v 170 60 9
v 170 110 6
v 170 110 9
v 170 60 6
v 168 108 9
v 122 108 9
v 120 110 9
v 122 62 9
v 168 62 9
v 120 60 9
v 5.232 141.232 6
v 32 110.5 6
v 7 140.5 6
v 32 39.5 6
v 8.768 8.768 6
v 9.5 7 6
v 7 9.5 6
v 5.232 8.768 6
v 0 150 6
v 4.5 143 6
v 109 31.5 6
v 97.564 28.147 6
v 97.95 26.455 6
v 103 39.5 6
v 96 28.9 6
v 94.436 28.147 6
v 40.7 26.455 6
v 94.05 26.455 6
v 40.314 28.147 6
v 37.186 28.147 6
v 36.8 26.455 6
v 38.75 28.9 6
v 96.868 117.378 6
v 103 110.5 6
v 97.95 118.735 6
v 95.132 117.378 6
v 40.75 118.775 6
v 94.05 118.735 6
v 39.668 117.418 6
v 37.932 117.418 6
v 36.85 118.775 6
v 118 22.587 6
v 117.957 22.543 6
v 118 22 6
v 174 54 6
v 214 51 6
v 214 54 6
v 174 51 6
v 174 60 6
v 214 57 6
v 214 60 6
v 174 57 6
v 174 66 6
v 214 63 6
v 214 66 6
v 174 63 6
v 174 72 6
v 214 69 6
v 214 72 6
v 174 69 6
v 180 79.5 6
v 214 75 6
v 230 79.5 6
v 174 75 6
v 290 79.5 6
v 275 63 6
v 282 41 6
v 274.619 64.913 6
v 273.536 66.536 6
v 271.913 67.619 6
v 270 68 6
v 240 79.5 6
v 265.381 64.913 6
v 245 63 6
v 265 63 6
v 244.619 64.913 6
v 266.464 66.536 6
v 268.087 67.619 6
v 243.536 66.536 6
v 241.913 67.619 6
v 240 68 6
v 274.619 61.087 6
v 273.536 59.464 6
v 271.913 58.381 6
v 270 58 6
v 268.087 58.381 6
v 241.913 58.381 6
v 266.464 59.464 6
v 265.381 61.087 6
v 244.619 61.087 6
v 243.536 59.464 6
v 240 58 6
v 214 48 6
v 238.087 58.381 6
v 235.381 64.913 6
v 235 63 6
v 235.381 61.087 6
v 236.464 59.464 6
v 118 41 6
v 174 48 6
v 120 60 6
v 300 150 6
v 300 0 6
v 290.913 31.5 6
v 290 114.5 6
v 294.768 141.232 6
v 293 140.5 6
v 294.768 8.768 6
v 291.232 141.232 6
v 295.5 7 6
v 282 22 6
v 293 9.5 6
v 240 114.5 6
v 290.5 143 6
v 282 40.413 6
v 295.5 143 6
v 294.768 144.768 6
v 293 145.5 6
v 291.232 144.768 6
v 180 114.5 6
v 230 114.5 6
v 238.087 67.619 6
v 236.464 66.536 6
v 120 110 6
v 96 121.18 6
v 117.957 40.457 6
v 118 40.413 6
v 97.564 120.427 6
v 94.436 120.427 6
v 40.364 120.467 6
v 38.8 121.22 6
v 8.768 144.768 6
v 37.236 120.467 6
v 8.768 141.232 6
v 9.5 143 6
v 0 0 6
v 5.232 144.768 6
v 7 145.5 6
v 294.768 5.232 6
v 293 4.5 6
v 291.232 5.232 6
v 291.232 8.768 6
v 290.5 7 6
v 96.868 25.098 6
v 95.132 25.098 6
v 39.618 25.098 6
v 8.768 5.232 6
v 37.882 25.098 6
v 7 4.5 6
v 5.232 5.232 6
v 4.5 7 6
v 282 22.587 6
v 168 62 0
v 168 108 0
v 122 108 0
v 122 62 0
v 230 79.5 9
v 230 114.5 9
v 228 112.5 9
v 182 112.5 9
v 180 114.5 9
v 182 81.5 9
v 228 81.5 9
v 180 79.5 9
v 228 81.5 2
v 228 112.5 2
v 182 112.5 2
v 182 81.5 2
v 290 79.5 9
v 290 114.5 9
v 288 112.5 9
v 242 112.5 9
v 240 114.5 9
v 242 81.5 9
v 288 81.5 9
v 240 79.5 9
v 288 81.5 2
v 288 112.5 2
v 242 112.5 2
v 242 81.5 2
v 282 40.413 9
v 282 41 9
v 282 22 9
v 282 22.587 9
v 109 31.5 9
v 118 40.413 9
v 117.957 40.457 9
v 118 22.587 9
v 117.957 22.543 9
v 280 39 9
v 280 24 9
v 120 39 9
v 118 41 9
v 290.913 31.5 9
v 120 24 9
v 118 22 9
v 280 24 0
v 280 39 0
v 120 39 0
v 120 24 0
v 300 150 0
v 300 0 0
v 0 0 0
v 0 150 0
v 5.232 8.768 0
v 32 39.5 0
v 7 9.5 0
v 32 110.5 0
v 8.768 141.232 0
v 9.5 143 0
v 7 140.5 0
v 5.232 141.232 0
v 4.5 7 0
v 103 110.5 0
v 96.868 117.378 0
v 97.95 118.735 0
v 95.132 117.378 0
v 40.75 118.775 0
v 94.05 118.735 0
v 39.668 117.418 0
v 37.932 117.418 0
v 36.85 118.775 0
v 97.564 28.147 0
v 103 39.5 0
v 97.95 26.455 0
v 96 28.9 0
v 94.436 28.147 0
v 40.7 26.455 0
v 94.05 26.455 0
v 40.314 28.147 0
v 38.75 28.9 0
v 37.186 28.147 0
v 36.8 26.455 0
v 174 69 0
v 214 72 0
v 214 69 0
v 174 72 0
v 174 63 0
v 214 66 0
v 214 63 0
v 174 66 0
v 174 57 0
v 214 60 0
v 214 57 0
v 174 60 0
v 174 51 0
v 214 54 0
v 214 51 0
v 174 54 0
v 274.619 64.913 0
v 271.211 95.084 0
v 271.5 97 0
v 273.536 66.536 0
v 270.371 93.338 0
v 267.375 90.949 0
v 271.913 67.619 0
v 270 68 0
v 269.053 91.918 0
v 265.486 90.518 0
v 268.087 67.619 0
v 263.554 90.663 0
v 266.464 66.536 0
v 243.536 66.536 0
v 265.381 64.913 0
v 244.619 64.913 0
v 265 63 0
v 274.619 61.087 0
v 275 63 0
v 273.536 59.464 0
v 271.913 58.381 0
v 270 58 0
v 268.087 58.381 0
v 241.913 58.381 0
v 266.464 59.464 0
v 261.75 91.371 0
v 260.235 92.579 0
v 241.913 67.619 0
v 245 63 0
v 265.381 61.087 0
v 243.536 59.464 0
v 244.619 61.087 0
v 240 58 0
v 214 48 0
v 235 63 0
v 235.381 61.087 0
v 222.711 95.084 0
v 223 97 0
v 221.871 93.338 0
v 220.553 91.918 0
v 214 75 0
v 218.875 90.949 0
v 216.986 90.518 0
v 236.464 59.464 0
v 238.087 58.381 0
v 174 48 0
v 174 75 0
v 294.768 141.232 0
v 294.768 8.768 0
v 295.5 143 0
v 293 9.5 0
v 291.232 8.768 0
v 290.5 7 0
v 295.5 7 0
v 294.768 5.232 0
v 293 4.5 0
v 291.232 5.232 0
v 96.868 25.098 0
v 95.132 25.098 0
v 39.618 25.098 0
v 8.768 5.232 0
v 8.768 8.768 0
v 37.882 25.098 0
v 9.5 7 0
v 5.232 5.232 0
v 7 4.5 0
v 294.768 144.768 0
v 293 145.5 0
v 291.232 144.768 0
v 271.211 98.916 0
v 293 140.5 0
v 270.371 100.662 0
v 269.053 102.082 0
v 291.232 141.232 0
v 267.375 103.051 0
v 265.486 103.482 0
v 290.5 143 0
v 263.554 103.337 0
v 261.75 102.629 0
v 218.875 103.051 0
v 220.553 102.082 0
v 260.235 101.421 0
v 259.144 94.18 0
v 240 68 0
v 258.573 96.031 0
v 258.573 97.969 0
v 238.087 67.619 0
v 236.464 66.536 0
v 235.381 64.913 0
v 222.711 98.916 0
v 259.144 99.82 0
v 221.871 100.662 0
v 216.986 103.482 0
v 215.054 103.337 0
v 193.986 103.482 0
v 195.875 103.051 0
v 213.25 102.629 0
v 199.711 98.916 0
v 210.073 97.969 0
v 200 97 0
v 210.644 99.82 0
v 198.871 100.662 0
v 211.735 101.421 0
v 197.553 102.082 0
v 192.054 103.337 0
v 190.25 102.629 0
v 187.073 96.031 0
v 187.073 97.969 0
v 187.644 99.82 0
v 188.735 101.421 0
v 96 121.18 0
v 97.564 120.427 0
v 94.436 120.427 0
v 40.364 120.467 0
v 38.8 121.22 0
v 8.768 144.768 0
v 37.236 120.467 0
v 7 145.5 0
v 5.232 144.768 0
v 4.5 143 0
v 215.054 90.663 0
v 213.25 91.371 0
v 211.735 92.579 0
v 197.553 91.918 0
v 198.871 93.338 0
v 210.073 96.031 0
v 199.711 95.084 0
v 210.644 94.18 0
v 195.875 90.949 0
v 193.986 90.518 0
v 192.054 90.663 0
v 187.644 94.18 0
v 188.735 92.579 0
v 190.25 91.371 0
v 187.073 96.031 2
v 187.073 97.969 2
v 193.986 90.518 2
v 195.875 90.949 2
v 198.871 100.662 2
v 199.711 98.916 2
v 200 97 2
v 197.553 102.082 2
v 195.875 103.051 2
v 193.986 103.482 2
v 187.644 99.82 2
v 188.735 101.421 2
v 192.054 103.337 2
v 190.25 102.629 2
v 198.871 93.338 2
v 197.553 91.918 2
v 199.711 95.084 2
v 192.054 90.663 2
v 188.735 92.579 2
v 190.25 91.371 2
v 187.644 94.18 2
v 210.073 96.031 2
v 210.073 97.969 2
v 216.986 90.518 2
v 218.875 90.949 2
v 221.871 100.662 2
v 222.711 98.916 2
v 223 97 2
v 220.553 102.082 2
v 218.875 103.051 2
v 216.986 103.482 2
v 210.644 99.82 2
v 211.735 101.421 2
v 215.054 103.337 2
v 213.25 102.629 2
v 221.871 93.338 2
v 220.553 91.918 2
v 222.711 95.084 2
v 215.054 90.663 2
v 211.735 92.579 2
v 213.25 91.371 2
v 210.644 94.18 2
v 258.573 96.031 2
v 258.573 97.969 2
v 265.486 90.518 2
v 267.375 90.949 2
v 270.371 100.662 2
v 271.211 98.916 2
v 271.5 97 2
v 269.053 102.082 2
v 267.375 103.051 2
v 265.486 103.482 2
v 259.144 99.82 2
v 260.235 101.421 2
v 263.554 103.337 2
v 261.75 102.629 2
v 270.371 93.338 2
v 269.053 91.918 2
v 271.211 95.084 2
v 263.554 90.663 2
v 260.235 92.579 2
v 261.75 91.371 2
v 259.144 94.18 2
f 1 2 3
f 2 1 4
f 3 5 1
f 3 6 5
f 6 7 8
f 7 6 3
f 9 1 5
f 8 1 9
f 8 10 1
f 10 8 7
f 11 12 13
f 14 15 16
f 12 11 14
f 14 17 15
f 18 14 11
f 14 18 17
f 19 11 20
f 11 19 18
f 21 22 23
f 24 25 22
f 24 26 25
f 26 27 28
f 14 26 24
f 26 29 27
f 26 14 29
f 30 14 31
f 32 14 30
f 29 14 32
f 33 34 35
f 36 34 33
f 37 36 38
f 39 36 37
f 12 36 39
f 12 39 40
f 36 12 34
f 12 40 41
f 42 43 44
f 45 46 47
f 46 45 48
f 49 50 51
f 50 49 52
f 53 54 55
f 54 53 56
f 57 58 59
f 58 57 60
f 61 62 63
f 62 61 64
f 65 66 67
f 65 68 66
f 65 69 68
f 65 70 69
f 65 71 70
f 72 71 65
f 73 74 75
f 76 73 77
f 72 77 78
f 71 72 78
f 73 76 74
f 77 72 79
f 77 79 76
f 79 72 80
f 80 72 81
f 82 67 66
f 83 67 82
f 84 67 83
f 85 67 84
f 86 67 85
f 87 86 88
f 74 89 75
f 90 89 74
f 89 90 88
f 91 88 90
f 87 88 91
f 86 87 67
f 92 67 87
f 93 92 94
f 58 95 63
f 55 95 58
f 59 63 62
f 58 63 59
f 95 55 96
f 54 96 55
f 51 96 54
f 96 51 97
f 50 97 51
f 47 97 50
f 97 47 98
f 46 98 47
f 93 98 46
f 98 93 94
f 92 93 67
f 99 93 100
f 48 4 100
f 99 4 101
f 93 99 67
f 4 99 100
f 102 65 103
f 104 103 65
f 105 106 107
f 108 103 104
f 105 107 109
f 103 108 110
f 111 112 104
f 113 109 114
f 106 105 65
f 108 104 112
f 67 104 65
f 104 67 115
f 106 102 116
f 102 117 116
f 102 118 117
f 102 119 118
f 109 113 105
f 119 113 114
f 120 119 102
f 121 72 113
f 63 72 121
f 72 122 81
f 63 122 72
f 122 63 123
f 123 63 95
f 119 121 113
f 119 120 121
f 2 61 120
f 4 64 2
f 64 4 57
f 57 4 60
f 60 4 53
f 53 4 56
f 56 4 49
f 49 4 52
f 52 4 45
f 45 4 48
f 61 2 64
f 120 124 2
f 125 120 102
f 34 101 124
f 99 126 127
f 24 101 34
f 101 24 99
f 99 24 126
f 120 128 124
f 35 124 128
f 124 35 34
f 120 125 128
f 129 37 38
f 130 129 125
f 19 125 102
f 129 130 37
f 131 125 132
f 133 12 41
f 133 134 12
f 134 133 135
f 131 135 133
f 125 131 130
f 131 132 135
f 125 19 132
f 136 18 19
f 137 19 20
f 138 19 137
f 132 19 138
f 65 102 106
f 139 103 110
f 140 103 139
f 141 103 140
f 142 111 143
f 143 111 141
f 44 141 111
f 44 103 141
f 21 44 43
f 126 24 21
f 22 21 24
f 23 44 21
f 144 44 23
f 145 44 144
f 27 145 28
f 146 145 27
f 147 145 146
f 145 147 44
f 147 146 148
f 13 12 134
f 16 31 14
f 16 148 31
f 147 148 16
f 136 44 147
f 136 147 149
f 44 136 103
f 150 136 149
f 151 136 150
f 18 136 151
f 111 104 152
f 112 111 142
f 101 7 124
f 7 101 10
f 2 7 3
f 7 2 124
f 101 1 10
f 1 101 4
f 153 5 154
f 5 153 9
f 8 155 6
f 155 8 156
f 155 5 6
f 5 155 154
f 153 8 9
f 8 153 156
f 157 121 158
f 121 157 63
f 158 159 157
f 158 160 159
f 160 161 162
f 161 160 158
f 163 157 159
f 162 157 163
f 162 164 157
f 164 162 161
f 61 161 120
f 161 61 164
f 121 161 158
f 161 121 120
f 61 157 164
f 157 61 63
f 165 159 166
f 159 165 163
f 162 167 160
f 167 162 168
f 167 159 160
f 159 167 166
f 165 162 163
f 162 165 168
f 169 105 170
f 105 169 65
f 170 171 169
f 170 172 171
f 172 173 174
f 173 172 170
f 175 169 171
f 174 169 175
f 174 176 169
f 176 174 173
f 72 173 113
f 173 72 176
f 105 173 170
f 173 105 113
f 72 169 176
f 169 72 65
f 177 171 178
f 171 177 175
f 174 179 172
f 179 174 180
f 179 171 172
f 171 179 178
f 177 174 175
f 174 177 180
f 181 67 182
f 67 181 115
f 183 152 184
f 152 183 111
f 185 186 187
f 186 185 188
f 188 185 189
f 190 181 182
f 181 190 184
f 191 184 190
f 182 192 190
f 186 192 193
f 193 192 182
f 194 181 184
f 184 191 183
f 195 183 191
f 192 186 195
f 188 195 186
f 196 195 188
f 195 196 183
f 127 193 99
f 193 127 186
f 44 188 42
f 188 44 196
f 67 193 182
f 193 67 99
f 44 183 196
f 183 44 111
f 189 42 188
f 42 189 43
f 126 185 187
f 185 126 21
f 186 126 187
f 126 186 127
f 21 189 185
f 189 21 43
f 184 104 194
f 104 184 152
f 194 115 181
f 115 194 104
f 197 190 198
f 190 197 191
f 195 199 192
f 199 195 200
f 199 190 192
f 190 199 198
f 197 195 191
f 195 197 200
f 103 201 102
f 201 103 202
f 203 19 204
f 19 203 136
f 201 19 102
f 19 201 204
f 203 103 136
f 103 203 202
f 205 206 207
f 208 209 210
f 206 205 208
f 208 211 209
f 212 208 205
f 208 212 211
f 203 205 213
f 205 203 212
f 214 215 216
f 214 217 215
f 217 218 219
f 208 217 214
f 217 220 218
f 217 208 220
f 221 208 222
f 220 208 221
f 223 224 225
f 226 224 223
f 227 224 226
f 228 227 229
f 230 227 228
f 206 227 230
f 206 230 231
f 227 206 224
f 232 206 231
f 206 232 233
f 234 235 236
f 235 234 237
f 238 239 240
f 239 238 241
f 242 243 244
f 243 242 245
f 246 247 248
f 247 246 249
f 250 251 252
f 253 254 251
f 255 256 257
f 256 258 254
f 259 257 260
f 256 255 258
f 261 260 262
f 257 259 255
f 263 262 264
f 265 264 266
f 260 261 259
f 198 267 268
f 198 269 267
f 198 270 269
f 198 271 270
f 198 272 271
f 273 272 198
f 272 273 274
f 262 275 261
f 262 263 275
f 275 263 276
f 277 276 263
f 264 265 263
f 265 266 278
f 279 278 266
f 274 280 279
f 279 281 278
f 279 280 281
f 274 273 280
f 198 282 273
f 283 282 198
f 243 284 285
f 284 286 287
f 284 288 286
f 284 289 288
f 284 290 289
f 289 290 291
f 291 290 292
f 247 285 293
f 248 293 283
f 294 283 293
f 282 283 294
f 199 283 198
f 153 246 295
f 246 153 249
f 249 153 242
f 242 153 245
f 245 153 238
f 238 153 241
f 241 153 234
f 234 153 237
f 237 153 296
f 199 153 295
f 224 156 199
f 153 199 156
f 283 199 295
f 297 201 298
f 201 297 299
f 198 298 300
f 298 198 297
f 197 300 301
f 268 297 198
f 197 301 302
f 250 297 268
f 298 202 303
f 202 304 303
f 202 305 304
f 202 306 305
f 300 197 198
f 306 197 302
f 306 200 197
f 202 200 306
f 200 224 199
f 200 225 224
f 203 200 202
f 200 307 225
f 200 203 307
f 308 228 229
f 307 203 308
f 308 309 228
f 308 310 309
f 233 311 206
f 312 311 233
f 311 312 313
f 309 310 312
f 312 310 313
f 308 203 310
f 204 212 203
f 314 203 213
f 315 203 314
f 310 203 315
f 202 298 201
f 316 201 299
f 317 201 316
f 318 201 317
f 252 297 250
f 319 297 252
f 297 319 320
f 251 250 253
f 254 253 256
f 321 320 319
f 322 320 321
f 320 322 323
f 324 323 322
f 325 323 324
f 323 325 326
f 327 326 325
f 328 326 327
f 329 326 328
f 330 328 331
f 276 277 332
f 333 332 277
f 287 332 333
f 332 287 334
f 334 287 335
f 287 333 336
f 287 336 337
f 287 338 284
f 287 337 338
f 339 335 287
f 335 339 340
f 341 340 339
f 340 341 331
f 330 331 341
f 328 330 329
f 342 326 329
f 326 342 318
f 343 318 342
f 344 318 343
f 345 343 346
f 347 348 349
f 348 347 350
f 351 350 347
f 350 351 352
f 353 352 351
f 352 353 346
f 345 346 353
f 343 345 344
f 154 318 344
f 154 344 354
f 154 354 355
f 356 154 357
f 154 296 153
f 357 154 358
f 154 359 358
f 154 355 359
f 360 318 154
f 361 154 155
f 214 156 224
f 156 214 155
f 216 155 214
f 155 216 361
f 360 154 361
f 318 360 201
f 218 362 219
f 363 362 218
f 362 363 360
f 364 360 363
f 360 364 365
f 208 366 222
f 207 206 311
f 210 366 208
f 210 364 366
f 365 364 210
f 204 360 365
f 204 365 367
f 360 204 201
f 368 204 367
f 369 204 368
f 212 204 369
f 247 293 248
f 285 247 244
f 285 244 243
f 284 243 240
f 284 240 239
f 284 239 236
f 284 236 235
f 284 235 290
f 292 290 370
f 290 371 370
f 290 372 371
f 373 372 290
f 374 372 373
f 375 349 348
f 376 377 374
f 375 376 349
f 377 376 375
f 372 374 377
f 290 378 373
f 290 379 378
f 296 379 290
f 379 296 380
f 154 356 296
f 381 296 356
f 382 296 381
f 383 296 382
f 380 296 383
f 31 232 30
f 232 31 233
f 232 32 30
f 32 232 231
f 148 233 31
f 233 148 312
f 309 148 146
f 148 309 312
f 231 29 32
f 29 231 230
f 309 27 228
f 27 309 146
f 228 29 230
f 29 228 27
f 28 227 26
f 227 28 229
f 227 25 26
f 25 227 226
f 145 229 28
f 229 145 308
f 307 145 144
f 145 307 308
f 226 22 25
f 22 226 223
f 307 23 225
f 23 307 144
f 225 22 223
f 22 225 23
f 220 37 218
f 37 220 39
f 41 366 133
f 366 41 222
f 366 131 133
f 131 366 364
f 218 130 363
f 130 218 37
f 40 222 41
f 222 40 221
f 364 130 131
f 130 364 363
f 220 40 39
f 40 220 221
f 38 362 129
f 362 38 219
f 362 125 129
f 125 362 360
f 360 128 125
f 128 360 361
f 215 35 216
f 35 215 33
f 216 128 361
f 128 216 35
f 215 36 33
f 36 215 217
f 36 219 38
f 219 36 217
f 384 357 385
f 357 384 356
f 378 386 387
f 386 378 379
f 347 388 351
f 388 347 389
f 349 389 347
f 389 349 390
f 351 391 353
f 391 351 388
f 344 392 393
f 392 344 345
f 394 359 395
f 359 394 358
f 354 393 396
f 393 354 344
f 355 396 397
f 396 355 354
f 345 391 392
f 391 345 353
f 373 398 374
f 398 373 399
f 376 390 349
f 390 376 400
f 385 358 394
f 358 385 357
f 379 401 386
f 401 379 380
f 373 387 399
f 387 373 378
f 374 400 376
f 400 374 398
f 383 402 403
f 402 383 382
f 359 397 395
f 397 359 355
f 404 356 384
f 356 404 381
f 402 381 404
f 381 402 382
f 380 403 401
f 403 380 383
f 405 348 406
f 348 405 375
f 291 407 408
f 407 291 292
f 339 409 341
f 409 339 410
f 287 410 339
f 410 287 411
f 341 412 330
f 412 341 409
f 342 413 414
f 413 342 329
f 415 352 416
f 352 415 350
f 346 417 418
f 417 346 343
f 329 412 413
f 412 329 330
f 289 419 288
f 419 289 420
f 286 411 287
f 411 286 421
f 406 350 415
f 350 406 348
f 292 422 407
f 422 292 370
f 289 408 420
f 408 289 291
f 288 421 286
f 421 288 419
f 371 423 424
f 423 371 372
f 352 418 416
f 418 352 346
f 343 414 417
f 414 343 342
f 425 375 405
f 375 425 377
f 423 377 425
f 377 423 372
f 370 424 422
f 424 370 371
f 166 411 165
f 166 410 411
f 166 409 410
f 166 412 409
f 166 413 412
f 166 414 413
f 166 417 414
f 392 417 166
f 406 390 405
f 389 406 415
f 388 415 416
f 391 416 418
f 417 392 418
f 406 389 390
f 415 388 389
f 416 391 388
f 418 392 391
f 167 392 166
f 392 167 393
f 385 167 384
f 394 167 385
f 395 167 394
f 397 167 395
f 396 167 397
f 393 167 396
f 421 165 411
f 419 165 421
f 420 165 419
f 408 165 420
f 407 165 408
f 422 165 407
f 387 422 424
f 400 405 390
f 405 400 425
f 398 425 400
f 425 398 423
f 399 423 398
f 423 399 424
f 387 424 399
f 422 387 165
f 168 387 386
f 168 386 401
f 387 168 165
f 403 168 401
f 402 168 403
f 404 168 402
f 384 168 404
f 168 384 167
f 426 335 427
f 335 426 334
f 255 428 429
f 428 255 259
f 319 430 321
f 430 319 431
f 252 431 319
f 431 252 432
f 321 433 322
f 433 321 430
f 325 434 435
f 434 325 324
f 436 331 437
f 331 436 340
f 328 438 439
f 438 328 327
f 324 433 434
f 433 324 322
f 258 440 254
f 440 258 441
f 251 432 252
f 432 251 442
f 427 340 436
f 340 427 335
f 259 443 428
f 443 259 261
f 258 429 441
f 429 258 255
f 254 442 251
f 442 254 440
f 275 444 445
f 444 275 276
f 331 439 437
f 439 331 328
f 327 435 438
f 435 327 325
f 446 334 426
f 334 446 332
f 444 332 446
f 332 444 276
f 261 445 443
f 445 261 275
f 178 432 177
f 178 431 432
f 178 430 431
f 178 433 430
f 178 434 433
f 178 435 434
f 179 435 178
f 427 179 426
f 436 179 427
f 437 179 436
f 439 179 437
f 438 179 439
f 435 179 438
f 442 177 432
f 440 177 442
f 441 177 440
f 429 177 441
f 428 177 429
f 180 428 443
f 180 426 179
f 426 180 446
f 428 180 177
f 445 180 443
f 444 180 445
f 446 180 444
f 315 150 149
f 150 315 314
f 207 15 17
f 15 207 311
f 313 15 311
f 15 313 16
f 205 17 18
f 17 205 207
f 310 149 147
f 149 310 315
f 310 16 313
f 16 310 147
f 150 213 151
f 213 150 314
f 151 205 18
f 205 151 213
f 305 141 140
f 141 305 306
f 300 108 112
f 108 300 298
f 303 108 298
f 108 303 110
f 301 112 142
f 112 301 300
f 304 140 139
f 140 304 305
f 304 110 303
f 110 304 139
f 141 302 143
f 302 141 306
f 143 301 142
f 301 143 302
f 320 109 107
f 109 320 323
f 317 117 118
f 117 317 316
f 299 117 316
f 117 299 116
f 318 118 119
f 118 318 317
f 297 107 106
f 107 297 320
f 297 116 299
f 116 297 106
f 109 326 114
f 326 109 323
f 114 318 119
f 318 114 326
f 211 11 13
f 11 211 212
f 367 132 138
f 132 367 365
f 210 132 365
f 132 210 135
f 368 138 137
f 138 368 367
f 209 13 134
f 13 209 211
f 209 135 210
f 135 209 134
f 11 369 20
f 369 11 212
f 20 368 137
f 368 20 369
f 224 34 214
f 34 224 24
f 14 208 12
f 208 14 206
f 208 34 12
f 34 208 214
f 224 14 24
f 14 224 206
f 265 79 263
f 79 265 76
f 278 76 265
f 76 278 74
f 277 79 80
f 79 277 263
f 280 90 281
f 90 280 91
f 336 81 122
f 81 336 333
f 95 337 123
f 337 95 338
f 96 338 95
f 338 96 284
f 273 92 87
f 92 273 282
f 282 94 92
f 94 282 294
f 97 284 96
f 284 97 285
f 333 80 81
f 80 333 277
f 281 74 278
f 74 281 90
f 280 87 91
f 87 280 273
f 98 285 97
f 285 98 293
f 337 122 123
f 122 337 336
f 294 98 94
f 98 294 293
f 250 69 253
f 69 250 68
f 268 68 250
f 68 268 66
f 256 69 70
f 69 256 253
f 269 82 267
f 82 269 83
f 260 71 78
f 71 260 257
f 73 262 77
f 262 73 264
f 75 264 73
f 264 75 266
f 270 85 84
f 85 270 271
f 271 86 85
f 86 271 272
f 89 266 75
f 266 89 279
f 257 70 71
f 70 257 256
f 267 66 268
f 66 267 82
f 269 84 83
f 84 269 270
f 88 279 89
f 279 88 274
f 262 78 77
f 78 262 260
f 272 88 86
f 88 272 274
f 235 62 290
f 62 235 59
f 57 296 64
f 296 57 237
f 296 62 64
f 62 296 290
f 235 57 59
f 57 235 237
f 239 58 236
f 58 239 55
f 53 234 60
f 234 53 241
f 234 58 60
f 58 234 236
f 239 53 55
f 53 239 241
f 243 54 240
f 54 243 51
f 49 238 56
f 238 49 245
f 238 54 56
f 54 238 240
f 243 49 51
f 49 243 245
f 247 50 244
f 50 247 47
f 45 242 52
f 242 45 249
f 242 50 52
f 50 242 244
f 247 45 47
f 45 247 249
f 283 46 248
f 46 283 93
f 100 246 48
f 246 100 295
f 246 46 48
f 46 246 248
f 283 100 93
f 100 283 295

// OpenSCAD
// file: ../../components/leds.scad
module led_10(color="red",tolerance=0){
    
    $fn=15;
    
    // Measurements taken from https://evandesigns.com/pages/information-about-led-sizes
    total_height = 13.6+tolerance;
    body_radius = (10.0+tolerance)/2;
    lip_radius = (11+tolerance)/2;
    lip_height = 2;
    
    led(color,body_radius,total_height,lip_radius,lip_height);
}

module led_5(color="red",tolerance=0){
    
    $fn=15;
    
    // Measurements taken from https://evandesigns.com/pages/information-about-led-sizes
    total_height = 9.69+tolerance;
    body_radius = (5.0+tolerance)/2;
    lip_radius = (5.9+tolerance)/2;
    lip_height = 1;
    
    led(color,body_radius,total_height,lip_radius,lip_height);
}

module led_3(color="red",tolerance=0){
    
    $fn=15;
    
    // Measurements taken from https://evandesigns.com/pages/information-about-led-sizes
    total_height = 5.49+tolerance;
    body_radius = (3.0+tolerance)/2;
    lip_radius = (3.74+tolerance)/2;
    lip_height = 1;
    
    led(color,body_radius,total_height,lip_radius,lip_height);
}

module led(led_color,body_radius,total_height,lip_radius,lip_height){
    color(led_color){
        // Body.
        cylinder(r=body_radius,h=total_height-body_radius);
        // Lip.
        cylinder(r=lip_radius,h=lip_height);
        // Dome.
        translate([0,0,total_height-body_radius]){
            sphere(r=body_radius);
        }
    }
    
    // Leads.
    color("gray"){
        translate([0,2,-10]){
            cylinder(r=.5,h=10);
        }
        translate([0,-2,-12]){
            cylinder(r=.5,h=12);
        }
    }
}

/*
// Examples
led_5(color="green");
translate([10,0,0]){
    led_3(color="yellow");
}
translate([-10,0,0]){
    led_10();
}
*/
// file: ../../components/led_bargraph.scad
include <leds.scad>;

module led_bargraph(length, width, depth, led_count){
    
    TOLERANCE = 1;      // adjust until LED's "snap-in" 
    END_CAP_LENGTH = 5; // usually the LED diameter
    FLANGE = 10;

    // computed
    bar_length = length-(END_CAP_LENGTH*2);
    
    color("yellow",0.2)
    difference(){
        union(){
            // bar
            cube([bar_length,width,depth]);
            // end caps
            translate([-END_CAP_LENGTH,0,0]){
                cube([5,width,depth]);
                translate([-FLANGE,0,0]){
                    cube([FLANGE,width,depth]);
                }
            }
            translate([bar_length,0,0]){
                cube([5,width,depth]);
                translate([END_CAP_LENGTH,0,0]){
                    cube([FLANGE,width,depth]);
                }
            }
        }
        // subtract leds
        translate([0,width/2,0]){
            for(i=[0:led_count]){
                translate([i*(bar_length/led_count),0,0]){
                    led_5(tolerance=TOLERANCE);
                }
            }
        }
    }
}

// examples
//led_bargraph(length=10, width=10, depth=12, led_count=1);
//led_bargraph(length=160, width=15, depth=11, led_count=10);
// main file
include <../../components/led_bargraph.scad>

/*
Carbonite control panels

1" = 25.4mm

maximums:
length: 15" (381mm)
width: 5" (127mm)
height: 2"
*/

BASE_LENGTH = 300;
BASE_WIDTH = 150;//120;
BASE_HEIGHT = 50;

SCREEN_LENGTH = 75;
SCREEN_WIDTH = 75;

LARGE_PANEL_LENGTH = 50;
LARGE_PANEL_WIDTH = 50;

SMALL_PANEL_LENGTH = 50;
SMALL_PANEL_WIDTH = 35;

LONG_PANEL_LENGTH = 160;
LONG_PANEL_WIDTH = 15;

VENT_LENGTH = 40;
VENT_WIDTH = 3;

// Adjust these to match the actual hardware
BUTTON_RADIUS = 20;
BUTTON_MOUNT_RADIUS = 10;

WALL_THICKNESS = 3;
FRAME_THICKNESS = 2;

// Render preview
PREVIEW = false;
EXPLODED = true;

// ***
// Call individual modules here to render them for printing
// ***
panel();
//led_bargraph(length=LONG_PANEL_LENGTH+(FRAME_THICKNESS*2), width=LONG_PANEL_WIDTH+(FRAME_THICKNESS*2), depth=10, led_count=10);

// CCP1
LCD_MAX_SQUARE = 53;

//***
// module definitions
//***

module arduino_uno(){
    
    $fn=30;
    
    TOLERANCE=1;
    LENGTH=68.6;
    WIDTH=53.3;
    HEIGHT=5;   // just a guess at the board thickness
    HOLE_DIAMETER=3.2+TOLERANCE;
    
    // mounting holes (only bother with the two we're going to use for now)
    UL = [14.0+1.3,2.5+5.1+27.9+15.2,-1];
    UR = [14.0+1.3+50.8,2.5+5.1+27.9,-1];
    
    color("blue"){
        cube([LENGTH,WIDTH,HEIGHT]);
    }
    translate(UL){
        cylinder(r=HOLE_DIAMETER/2,h=HEIGHT*4);
    }
    translate(UR){
        cylinder(r=HOLE_DIAMETER/2,h=HEIGHT*4);
    }
}

module hiletgo_3_5_IPS_LCD(){    
    // Measured with LCD facing forward, pins on the right.
    LENGTH=96.6;
    WIDTH=60.7;
    HEIGHT=1.6;//4.9;
    MOUNTING_HOLE_DIAMETER=2.0; // measured at 1.5, but we're using M2 bolts so...
    MOUNTING_HOLE_Z_OFFSET = -1;
        
    // mounting hole offsets
    // left, top
    TL = [0.9+(MOUNTING_HOLE_DIAMETER/2),WIDTH-(0.45+(MOUNTING_HOLE_DIAMETER/2)),MOUNTING_HOLE_Z_OFFSET];
    // left, bottom
    BL = [0.9+(MOUNTING_HOLE_DIAMETER/2),1+(MOUNTING_HOLE_DIAMETER/2),MOUNTING_HOLE_Z_OFFSET];
    // right, top
    TR = [LENGTH-(1.38+(MOUNTING_HOLE_DIAMETER/2)),WIDTH-(0.5+(MOUNTING_HOLE_DIAMETER/2)),MOUNTING_HOLE_Z_OFFSET];
    // right, bottom
    BR = [LENGTH-(1.42+(MOUNTING_HOLE_DIAMETER/2)),1.0+(MOUNTING_HOLE_DIAMETER/2),MOUNTING_HOLE_Z_OFFSET];
    
    // LCD screen itself
    LCD_MODULE_LENGTH=84.95;
    LCD_MODULE_WIDTH=55.5;
    LCD_MODULE_HEIGHT=4.75-HEIGHT;
        
    union(){
        // board
        color("green"){
            cube([96.0,60.3,HEIGHT]);
        }
        // screen
        translate([5.2,2.75,HEIGHT]){
            color("black"){
                cube([LCD_MODULE_LENGTH,LCD_MODULE_WIDTH,LCD_MODULE_HEIGHT]);
            }
        }
    }
    
    // mounting holes
    translate(TL){
        cylinder(r=MOUNTING_HOLE_DIAMETER,h=HEIGHT*8);
    }
    translate(BL){
        cylinder(r=MOUNTING_HOLE_DIAMETER,h=HEIGHT*8);
    }
    translate(TR){
        cylinder(r=MOUNTING_HOLE_DIAMETER,h=HEIGHT*8);
    }
    translate(BR){
        cylinder(r=MOUNTING_HOLE_DIAMETER,h=HEIGHT*8);
    }
}

// base
module base(){
    difference(){
        cube([BASE_LENGTH,BASE_WIDTH,BASE_HEIGHT]);
        translate([WALL_THICKNESS,WALL_THICKNESS,WALL_THICKNESS]){
            cube([BASE_LENGTH-(WALL_THICKNESS*2),BASE_WIDTH-(WALL_THICKNESS*2),BASE_HEIGHT]);
        }
    }
}

// main panel
module panel(){
    color("grey")
    difference(){
        
        // panel base and frames
        union(){
            cube([BASE_LENGTH,BASE_WIDTH,WALL_THICKNESS]);
            translate([0,0,WALL_THICKNESS]){
                cube([BASE_LENGTH,BASE_WIDTH,WALL_THICKNESS]);
                
                translate([BASE_LENGTH*.40,BASE_WIDTH*.40,WALL_THICKNESS]){
                    large_frame();
                }
                translate([BASE_LENGTH*.60,BASE_WIDTH*.53,WALL_THICKNESS]){
                    small_frame();
                }
                translate([BASE_LENGTH*.80,BASE_WIDTH*.53,WALL_THICKNESS]){
                    small_frame();
                }
                translate([(BASE_LENGTH*.40)-FRAME_THICKNESS,(BASE_WIDTH*.16)-FRAME_THICKNESS,WALL_THICKNESS]){
                    long_frame();
                }    
            }
        }
        
        // mounting holes
        mounting_bolt_shaft_diameter = 5;
        translate([7,7,-1]){
            cylinder(r=mounting_bolt_shaft_diameter/2,h=WALL_THICKNESS*3);
        }
        translate([BASE_LENGTH-7,7,-1]){
            cylinder(r=mounting_bolt_shaft_diameter/2,h=WALL_THICKNESS*3);
        }
        translate([BASE_LENGTH-7,BASE_WIDTH-7,-1]){
            cylinder(r=mounting_bolt_shaft_diameter/2,h=WALL_THICKNESS*3);
        }
        translate([7,BASE_WIDTH-7,-1]){
            cylinder(r=mounting_bolt_shaft_diameter/2,h=WALL_THICKNESS*3);
        }
        
        // LCD mounting holes
        translate([98,(BASE_WIDTH/2)-50,-5]){
            rotate([0,0,90]){
                hiletgo_3_5_IPS_LCD();
            }
        }
        
        // screen opening
        translate([BASE_LENGTH*.10+FRAME_THICKNESS,(BASE_WIDTH/2)-(SCREEN_WIDTH/2)+FRAME_THICKNESS,-1]){
            cube([SCREEN_LENGTH-(FRAME_THICKNESS*2),SCREEN_WIDTH-(FRAME_THICKNESS*2),(WALL_THICKNESS*2)+2]);
        }
        
        // large subpanel opening
        translate([BASE_LENGTH*.40+FRAME_THICKNESS,BASE_WIDTH*.40+FRAME_THICKNESS,-1]){
            cube([LARGE_PANEL_LENGTH-(FRAME_THICKNESS*2),LARGE_PANEL_WIDTH-(FRAME_THICKNESS*2),(WALL_THICKNESS*2)+2]);
        }
        
        // small subpanel A
        translate([BASE_LENGTH*.60+FRAME_THICKNESS,BASE_WIDTH*.53+FRAME_THICKNESS,-1]){
            subpanel_length = SMALL_PANEL_LENGTH-(FRAME_THICKNESS*2);
            subpanel_width = SMALL_PANEL_WIDTH-(FRAME_THICKNESS*2);
            
            translate([subpanel_length/4,subpanel_width/2,-1]){
                cylinder(r=13/2,h=(WALL_THICKNESS*2)+2);
            }
            translate([subpanel_length-(subpanel_length/4),subpanel_width/2,-1]){
                cylinder(r=13/2,h=WALL_THICKNESS+2);
            }
            translate([0,0,WALL_THICKNESS]){
                cube([SMALL_PANEL_LENGTH-(FRAME_THICKNESS*2),SMALL_PANEL_WIDTH-(FRAME_THICKNESS*2),WALL_THICKNESS+2]);
            }
        }
        
        // small subpanel B
        translate([BASE_LENGTH*.80+FRAME_THICKNESS,BASE_WIDTH*.53+FRAME_THICKNESS,-1]){
            subpanel_length = SMALL_PANEL_LENGTH-(FRAME_THICKNESS*2);
            subpanel_width = SMALL_PANEL_WIDTH-(FRAME_THICKNESS*2);
            
            translate([subpanel_length/2,subpanel_width/2,-WALL_THICKNESS-1]){
                cylinder(r=13/2,h=(WALL_THICKNESS*2)+2);
            }
            translate([0,0,WALL_THICKNESS]){
                cube([SMALL_PANEL_LENGTH-(FRAME_THICKNESS*2),SMALL_PANEL_WIDTH-(FRAME_THICKNESS*2),WALL_THICKNESS+2]);
            }
        }
        
        // knob/button A
        translate([BASE_LENGTH*.80,BASE_WIDTH*.42,-1]){
            cylinder(r=BUTTON_MOUNT_RADIUS/2,h=(WALL_THICKNESS*2)+2);
        }
        
        // knob/button B
        translate([BASE_LENGTH*.90,BASE_WIDTH*.42,-1]){
            cylinder(r=BUTTON_MOUNT_RADIUS/2,h=(WALL_THICKNESS*2)+2);
        }
        
        // long panel opening
        translate([BASE_LENGTH*.40,BASE_WIDTH*.16,-1]){
            cube([LONG_PANEL_LENGTH,LONG_PANEL_WIDTH,(WALL_THICKNESS*2)+2]);
        }
        
        // vents
        translate([BASE_LENGTH*.58,BASE_WIDTH*.48,-1]){
            cube([VENT_LENGTH,VENT_WIDTH,(WALL_THICKNESS*2)+2]);
        }
        translate([BASE_LENGTH*.58,BASE_WIDTH*.44,-1]){
            cube([VENT_LENGTH,VENT_WIDTH,(WALL_THICKNESS*2)+2]);
        }
        translate([BASE_LENGTH*.58,BASE_WIDTH*.40,-1]){
            cube([VENT_LENGTH,VENT_WIDTH,(WALL_THICKNESS*2)+2]);
        }
        translate([BASE_LENGTH*.58,BASE_WIDTH*.36,-1]){
            cube([VENT_LENGTH,VENT_WIDTH,(WALL_THICKNESS*2)+2]);
        }
         translate([BASE_LENGTH*.58,BASE_WIDTH*.32,-1]){
            cube([VENT_LENGTH,VENT_WIDTH,(WALL_THICKNESS*2)+2]);
        }
    }
}

// screen
module screen_frame(){
    color("white")
    difference(){
        cube([SCREEN_LENGTH,SCREEN_WIDTH,WALL_THICKNESS]);
        translate([(SCREEN_LENGTH/2)-(LCD_MAX_SQUARE/2),(SCREEN_LENGTH/2)-(LCD_MAX_SQUARE/2),-1]){
            cube([LCD_MAX_SQUARE,LCD_MAX_SQUARE,WALL_THICKNESS+2]);
        }
    }
}

// large panel
module large_panel(thickness=WALL_THICKNESS){
    color("yellow",0.2)
    difference(){
        cube([LARGE_PANEL_LENGTH,LARGE_PANEL_WIDTH,thickness]);
    }
}

// large panel with 4 10mm LEDs
// TODO: 10mm LED's need a little more clearance
module large_led_panel(){
    difference(){
        large_panel(10);
        translate([LARGE_PANEL_LENGTH/4,LARGE_PANEL_WIDTH/4,0]){
            led_10();
        }
        translate([LARGE_PANEL_LENGTH-(LARGE_PANEL_LENGTH/4),LARGE_PANEL_WIDTH/4,0]){
            led_10();
        }
        translate([LARGE_PANEL_LENGTH/4,LARGE_PANEL_WIDTH-(LARGE_PANEL_WIDTH/4),0]){
            led_10();
        }
        translate([LARGE_PANEL_LENGTH-(LARGE_PANEL_LENGTH/4),LARGE_PANEL_WIDTH-(LARGE_PANEL_WIDTH/4),0]){
            led_10();
        }
    }
}

module large_frame(){
    color("white")
    difference(){
        cube([LARGE_PANEL_LENGTH,LARGE_PANEL_WIDTH,WALL_THICKNESS]);
        translate([FRAME_THICKNESS,FRAME_THICKNESS,-1]){
            cube([LARGE_PANEL_LENGTH-(FRAME_THICKNESS*2),LARGE_PANEL_WIDTH-(FRAME_THICKNESS*2),WALL_THICKNESS+2]);
        }
    }
}

// small panel
module small_panel(){
    color("yellow",0.2)
    difference(){
        cube([SMALL_PANEL_LENGTH,SMALL_PANEL_WIDTH,WALL_THICKNESS]);
    }
}

// small panel with 1 large toggle switch
module small_panel_1_large_toggle(){
    difference(){
        small_panel();
        translate([SMALL_PANEL_LENGTH/2,SMALL_PANEL_WIDTH/2,-1]){
            cylinder(r=13/2,h=WALL_THICKNESS+2);
        }
    }
}

// small panel with 2 illuminated pusbuttons
module small_panel_2_buttons(){
    difference(){
        small_panel();
        translate([SMALL_PANEL_LENGTH/4,SMALL_PANEL_WIDTH/2,-1]){
            cylinder(r=13/2,h=WALL_THICKNESS+2);
        }
        translate([SMALL_PANEL_LENGTH-(SMALL_PANEL_LENGTH/4),SMALL_PANEL_WIDTH-(SMALL_PANEL_WIDTH/2),-1]){
            cylinder(r=13/2,h=WALL_THICKNESS+2);
        }
    }
}

module small_frame(){
    color("white")
    difference(){
        cube([SMALL_PANEL_LENGTH,SMALL_PANEL_WIDTH,WALL_THICKNESS]);
        translate([FRAME_THICKNESS,FRAME_THICKNESS,-1]){
            cube([SMALL_PANEL_LENGTH-(FRAME_THICKNESS*2),SMALL_PANEL_WIDTH-(FRAME_THICKNESS*2),WALL_THICKNESS+2]);
        }
    }
}

// long frame
module long_frame(){
    
    length = LONG_PANEL_LENGTH+(FRAME_THICKNESS*2);
    width = LONG_PANEL_WIDTH+(FRAME_THICKNESS*2);
    
    color("white")
    difference(){
        union(){
            cube([length,width,WALL_THICKNESS]);
            translate([-width/2+.5,width/2,0]){
                rotate([0,0,-45]){
                    cube([width/1.5,width/1.5,WALL_THICKNESS]);
                }
            }
            translate([length-(width/2)+0.5,width/2,0]){
                rotate([0,0,-45]){
                    cube([width/1.5,width/1.5,WALL_THICKNESS]);
                }
            }
        }
        translate([FRAME_THICKNESS,FRAME_THICKNESS,-1]){
            cube([LONG_PANEL_LENGTH,LONG_PANEL_WIDTH,WALL_THICKNESS+2]);
        }
    }
}

module knob(){
    color("brown")
    cylinder(r=BUTTON_RADIUS/2,h=WALL_THICKNESS*3);
}

module button(){
    cylinder(r=BUTTON_RADIUS/2,h=WALL_THICKNESS*3);
}


// assemble!
if (PREVIEW){
    //color("gray"){
        //base();
        translate([98,(BASE_WIDTH/2)-50,45]){
            rotate([0,0,90]){
                hiletgo_3_5_IPS_LCD();
            }
        }
    //}
    if (EXPLODED){
        translate([0,0,BASE_HEIGHT*2]){
            panel();
            translate([BASE_LENGTH*.10,(BASE_WIDTH/2)-(SCREEN_WIDTH/2),BASE_HEIGHT]){
                screen_frame();
            }
            translate([BASE_LENGTH*.40,BASE_WIDTH*.40,BASE_HEIGHT]){
                large_panel();
                translate([0,0,BASE_HEIGHT]){
                    large_frame();
                }
            }
            translate([BASE_LENGTH*.60,BASE_WIDTH*.53,BASE_HEIGHT]){
                small_panel();
                translate([0,0,BASE_HEIGHT]){
                    small_frame();
                }
            }
            translate([BASE_LENGTH*.80,BASE_WIDTH*.53,BASE_HEIGHT]){
                small_panel();
                translate([0,0,BASE_HEIGHT]){
                    small_frame();
                }
            }
            // knob/button A
            translate([BASE_LENGTH*.80,BASE_WIDTH*.42,-1]){
                knob();
            }
            // knob/button B
            translate([BASE_LENGTH*.90,BASE_WIDTH*.42,-1]){
                knob();
            }        
            translate([BASE_LENGTH*.40,BASE_WIDTH*.16,BASE_HEIGHT]){
                led_bargraph(length=160, width=15, depth=11, led_count=10);
            }
        }
    } else {
        translate([0,0,BASE_HEIGHT]){
            cover();        
            translate([BASE_LENGTH*.10,(BASE_WIDTH/2)-(SCREEN_WIDTH/2),WALL_THICKNESS]){
                screen_frame();
            }        
            translate([BASE_LENGTH*.40,BASE_WIDTH*.40,-WALL_THICKNESS]){
                large_panel();
                translate([0,0,WALL_THICKNESS+1.1]){
                    large_frame();
                }
            }
            translate([BASE_LENGTH*.60,BASE_WIDTH*.53,-WALL_THICKNESS]){
                small_panel();
                translate([0,0,WALL_THICKNESS+1.1]){
                    small_frame();
                }
            }
            translate([BASE_LENGTH*.80,BASE_WIDTH*.53,-WALL_THICKNESS]){
                small_panel();
                translate([0,0,WALL_THICKNESS+1.1]){
                    small_frame();
                }
            }
            translate([BASE_LENGTH*.80,BASE_WIDTH*.42,WALL_THICKNESS]){
                knob();
            }        
            translate([BASE_LENGTH*.90,BASE_WIDTH*.42,WALL_THICKNESS]){
                knob();
            }                
            translate([(BASE_LENGTH*.40)-FRAME_THICKNESS,(BASE_WIDTH*.16)-FRAME_THICKNESS,WALL_THICKNESS]){
                long_frame();
                translate([5,0,-11]){
                    led_bargraph(length=LONG_PANEL_LENGTH+(FRAME_THICKNESS*2), width=LONG_PANEL_WIDTH+(FRAME_THICKNESS*2), depth=11, led_count=10);
                }
            }
        }
    }
}
